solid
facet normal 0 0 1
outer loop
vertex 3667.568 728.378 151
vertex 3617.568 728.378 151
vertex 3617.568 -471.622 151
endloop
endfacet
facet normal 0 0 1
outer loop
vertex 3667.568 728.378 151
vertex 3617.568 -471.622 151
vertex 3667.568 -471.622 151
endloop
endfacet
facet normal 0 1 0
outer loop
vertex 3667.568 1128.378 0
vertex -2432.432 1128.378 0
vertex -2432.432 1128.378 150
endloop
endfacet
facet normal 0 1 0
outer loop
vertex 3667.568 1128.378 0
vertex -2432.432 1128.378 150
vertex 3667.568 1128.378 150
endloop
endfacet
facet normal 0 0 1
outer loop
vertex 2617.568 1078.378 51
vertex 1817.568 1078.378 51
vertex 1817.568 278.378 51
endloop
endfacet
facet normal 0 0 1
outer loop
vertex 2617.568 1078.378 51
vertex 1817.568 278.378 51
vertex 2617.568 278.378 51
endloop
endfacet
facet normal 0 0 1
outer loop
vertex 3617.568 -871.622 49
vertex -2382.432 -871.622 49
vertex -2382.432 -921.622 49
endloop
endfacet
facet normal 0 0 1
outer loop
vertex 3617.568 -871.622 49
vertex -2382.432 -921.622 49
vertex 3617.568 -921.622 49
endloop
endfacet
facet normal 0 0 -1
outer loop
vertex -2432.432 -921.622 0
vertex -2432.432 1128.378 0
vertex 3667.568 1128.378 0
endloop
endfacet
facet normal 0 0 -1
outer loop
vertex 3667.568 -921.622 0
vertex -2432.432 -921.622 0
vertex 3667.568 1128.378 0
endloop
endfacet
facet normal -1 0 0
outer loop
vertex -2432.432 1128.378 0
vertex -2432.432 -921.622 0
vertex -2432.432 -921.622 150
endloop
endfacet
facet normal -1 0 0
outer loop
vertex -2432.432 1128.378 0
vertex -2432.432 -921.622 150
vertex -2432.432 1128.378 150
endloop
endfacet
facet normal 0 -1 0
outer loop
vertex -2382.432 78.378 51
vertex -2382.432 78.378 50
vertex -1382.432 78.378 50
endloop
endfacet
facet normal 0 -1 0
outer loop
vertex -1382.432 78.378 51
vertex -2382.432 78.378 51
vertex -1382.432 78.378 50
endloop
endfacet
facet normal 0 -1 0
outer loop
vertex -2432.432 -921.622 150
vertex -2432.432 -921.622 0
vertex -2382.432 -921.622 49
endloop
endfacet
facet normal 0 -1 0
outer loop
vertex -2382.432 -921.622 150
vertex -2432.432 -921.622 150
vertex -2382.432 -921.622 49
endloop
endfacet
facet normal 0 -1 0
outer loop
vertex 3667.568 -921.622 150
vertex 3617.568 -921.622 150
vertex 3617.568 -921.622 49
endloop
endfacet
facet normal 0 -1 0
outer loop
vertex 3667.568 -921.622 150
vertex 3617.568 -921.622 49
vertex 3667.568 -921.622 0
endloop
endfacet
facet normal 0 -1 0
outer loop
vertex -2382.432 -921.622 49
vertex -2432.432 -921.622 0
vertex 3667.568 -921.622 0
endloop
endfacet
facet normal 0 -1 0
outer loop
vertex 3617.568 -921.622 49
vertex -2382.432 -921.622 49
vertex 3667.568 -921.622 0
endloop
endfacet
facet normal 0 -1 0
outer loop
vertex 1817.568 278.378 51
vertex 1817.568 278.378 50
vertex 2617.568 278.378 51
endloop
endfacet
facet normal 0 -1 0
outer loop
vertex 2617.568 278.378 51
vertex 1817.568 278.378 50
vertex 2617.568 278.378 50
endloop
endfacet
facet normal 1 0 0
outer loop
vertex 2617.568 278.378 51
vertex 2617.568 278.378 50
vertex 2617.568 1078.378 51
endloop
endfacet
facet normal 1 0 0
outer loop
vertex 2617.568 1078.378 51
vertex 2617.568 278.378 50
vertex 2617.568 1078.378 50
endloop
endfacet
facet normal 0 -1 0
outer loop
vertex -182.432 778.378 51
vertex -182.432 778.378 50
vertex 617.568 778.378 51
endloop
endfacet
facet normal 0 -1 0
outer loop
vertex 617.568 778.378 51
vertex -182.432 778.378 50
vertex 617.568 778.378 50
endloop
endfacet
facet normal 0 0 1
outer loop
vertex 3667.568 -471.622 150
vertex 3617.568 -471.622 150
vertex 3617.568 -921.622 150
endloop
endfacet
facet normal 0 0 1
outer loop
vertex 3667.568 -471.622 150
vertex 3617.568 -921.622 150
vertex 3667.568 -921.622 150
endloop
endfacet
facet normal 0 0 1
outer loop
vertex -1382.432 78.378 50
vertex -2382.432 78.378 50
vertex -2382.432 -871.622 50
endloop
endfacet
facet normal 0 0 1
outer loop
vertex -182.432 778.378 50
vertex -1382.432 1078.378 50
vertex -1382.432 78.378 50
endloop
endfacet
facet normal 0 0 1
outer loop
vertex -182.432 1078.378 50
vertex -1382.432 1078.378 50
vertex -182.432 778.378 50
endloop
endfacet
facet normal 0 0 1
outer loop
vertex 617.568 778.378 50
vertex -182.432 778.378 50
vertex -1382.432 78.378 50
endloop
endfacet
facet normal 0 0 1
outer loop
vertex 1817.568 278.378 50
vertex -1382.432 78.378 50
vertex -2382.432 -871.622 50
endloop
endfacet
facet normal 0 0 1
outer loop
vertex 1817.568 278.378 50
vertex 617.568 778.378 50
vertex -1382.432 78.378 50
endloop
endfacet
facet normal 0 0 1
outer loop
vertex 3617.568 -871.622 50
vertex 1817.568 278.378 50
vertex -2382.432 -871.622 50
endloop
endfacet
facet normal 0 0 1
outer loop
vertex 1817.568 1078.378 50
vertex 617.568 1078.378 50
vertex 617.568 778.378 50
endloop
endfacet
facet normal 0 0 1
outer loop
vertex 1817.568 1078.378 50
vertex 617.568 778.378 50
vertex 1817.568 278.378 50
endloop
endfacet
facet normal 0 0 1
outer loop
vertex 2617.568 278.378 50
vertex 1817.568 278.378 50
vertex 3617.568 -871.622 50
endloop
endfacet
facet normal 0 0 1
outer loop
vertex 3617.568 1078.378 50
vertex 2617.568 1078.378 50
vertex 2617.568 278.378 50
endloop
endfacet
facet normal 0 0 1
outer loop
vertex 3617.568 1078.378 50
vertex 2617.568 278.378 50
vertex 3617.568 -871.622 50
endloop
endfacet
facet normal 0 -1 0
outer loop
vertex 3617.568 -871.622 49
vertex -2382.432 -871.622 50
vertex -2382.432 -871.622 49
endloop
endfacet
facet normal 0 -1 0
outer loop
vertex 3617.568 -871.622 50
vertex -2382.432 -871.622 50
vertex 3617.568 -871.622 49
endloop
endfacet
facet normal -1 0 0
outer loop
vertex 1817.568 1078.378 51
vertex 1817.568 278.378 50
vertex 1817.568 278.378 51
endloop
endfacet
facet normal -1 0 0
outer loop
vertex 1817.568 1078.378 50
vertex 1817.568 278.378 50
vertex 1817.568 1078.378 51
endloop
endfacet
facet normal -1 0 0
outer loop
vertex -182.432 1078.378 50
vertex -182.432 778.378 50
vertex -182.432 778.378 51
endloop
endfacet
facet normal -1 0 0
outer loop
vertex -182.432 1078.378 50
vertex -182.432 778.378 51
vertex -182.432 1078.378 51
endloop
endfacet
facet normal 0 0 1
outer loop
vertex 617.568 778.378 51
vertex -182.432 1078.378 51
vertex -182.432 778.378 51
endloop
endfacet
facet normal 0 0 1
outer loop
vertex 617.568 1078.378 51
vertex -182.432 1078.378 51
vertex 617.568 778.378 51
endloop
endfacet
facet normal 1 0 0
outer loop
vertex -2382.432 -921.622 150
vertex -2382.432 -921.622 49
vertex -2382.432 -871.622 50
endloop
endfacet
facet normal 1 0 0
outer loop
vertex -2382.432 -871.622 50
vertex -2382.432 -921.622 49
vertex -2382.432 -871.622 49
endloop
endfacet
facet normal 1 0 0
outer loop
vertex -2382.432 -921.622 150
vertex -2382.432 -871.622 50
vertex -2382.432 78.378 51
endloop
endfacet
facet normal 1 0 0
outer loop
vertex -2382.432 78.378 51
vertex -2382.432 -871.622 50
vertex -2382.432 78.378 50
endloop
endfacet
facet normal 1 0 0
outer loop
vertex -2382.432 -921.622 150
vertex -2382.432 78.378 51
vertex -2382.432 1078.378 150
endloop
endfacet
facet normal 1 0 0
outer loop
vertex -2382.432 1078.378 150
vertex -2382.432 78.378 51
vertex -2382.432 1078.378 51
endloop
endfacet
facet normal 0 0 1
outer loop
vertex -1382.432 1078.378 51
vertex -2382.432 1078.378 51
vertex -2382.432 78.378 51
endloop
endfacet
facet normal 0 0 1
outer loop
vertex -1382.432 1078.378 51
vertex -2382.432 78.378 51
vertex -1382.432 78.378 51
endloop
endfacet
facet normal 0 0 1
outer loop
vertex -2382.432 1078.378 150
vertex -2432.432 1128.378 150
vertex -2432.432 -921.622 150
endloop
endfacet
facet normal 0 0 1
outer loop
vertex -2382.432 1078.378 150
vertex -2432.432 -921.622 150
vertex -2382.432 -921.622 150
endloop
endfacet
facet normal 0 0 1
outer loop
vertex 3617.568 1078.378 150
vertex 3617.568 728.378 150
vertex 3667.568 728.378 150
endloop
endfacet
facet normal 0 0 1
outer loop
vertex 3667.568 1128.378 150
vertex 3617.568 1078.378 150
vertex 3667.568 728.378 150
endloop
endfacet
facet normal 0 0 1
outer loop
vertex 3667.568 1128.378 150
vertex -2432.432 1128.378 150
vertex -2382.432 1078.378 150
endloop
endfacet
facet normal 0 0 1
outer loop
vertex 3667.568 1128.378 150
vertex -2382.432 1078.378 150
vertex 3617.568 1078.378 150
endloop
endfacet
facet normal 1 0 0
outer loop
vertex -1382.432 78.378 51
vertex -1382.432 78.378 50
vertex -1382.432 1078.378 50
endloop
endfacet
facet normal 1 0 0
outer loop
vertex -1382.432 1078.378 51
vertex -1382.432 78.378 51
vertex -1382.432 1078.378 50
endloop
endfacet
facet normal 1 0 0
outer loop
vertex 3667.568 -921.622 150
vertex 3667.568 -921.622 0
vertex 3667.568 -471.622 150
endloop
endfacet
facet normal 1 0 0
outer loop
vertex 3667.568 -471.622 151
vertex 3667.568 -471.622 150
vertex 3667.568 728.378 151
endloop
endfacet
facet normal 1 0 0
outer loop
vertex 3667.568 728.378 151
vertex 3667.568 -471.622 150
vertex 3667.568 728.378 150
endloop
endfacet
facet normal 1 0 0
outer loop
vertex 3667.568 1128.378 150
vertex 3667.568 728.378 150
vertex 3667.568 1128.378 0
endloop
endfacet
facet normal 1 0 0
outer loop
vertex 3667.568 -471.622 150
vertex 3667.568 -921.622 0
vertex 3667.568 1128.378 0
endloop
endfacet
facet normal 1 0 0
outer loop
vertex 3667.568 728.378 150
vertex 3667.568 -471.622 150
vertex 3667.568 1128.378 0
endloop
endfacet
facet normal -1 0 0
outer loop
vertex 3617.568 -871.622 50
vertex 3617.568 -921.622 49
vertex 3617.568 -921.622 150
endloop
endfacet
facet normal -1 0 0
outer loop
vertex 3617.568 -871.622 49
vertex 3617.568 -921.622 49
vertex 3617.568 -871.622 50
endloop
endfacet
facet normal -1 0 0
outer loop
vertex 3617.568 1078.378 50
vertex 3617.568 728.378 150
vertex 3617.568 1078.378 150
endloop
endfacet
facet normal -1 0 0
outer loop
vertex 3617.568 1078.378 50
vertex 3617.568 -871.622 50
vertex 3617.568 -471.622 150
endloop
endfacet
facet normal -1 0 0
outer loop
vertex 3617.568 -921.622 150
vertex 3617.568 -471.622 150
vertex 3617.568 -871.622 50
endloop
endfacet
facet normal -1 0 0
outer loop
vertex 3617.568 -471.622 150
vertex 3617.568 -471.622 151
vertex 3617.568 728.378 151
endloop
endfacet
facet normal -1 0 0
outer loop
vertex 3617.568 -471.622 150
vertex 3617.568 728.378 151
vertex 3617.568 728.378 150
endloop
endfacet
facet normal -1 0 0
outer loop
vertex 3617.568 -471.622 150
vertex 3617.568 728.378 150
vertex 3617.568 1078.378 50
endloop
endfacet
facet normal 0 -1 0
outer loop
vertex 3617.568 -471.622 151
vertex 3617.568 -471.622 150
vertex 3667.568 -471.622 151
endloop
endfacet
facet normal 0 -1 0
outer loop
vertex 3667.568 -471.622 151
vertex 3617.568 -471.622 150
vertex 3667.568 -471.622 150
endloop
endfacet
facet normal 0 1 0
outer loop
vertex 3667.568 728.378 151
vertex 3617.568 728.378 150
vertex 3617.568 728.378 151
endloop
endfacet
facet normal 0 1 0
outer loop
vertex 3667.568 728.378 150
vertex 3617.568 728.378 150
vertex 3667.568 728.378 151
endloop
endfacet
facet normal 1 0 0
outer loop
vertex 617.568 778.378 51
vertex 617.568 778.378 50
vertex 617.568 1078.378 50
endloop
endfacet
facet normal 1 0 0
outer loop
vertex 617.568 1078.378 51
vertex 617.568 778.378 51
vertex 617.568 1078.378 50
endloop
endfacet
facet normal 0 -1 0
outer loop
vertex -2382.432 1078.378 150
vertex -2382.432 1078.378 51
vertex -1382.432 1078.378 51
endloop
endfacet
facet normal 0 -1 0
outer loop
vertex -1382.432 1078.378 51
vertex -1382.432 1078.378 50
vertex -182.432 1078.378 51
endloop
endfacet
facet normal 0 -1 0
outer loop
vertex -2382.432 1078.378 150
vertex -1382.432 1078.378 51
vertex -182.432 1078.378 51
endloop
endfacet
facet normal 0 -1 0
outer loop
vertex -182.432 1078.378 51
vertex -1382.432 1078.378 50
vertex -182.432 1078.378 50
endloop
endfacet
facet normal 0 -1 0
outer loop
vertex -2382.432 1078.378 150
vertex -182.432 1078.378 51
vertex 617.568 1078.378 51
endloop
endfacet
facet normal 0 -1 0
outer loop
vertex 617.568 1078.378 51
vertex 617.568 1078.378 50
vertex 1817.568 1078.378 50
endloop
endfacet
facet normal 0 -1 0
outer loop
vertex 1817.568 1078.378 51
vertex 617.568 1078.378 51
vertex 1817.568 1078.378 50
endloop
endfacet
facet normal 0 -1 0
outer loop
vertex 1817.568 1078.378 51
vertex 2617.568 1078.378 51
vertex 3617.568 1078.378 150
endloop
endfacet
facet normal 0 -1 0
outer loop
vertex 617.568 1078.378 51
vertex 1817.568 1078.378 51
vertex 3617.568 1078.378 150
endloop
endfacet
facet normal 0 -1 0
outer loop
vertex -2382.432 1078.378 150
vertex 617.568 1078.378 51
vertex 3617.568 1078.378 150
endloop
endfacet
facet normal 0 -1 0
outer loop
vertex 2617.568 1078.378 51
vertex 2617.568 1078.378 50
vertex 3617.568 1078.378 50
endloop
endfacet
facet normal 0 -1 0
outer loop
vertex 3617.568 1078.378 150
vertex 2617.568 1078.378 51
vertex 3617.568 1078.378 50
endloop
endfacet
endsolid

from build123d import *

# Parameters (mm, degrees)
SKETCH1_W           = 6100
SKETCH1_H           = 2050
BOSS_EXTRUDE1_DEPTH = 150
SHELL1_T            = -50
SKETCH2_W           = 1000
SKETCH2_H           = 1000
BOSS_EXTRUDE2_DEPTH = 1
SKETCH3_W           = 800
SKETCH3_H           = 800
BOSS_EXTRUDE3_DEPTH = 1
SKETCH4_W           = 800
SKETCH4_H           = 300
BOSS_EXTRUDE4_DEPTH = 1
SKETCH5_W           = 50
SKETCH5_H           = 1200
BOSS_EXTRUDE5_DEPTH = 1
SKETCH6_W           = 6000
SKETCH6_H           = 50
CUT_EXTRUDE1_DEPTH  = 101


with BuildPart() as part:
    # Sketch1 → Boss-Extrude1 (new body)
    with BuildSketch(Plane.XY):
        with Locations((617.567567568, 103.378378378)):
            Rectangle(SKETCH1_W, SKETCH1_H)
    extrude(amount=BOSS_EXTRUDE1_DEPTH)

    # Shell1
    shell1_openings = [part.faces().sort_by_distance(p)[0] for p in [
        (617.567567568, 103.378378378, 150),
    ]]
    offset(amount=SHELL1_T, openings=shell1_openings, kind=Kind.INTERSECTION)

    # Sketch2 → Boss-Extrude2 (add)
    with BuildSketch(Plane.XY.offset(50)):
        with Locations((-1882.432432432, 578.378378378)):
            Rectangle(SKETCH2_W, SKETCH2_H)
    extrude(amount=BOSS_EXTRUDE2_DEPTH)

    # Sketch3 → Boss-Extrude3 (add)
    with BuildSketch(Plane.XY.offset(50)):
        with Locations((2217.567567568, 678.378378378)):
            Rectangle(SKETCH3_W, SKETCH3_H)
    extrude(amount=BOSS_EXTRUDE3_DEPTH)

    # Sketch4 → Boss-Extrude4 (add)
    with BuildSketch(Plane.XY.offset(50)):
        with Locations((217.567567568, 928.378378378)):
            Rectangle(SKETCH4_W, SKETCH4_H)
    extrude(amount=BOSS_EXTRUDE4_DEPTH)

    # Sketch5 → Boss-Extrude5 (add)
    with BuildSketch(Plane.XY.offset(150)):
        with Locations((3642.567567568, 128.378378378)):
            Rectangle(SKETCH5_W, SKETCH5_H)
    extrude(amount=BOSS_EXTRUDE5_DEPTH)

    # Sketch6 → Cut-Extrude1 (cut)
    with BuildSketch(Plane.XY.offset(150)):
        with Locations((617.567567568, -896.621621622)):
            Rectangle(SKETCH6_W, SKETCH6_H)
    extrude(amount=-CUT_EXTRUDE1_DEPTH, mode=Mode.SUBTRACT)


solid = part.part
